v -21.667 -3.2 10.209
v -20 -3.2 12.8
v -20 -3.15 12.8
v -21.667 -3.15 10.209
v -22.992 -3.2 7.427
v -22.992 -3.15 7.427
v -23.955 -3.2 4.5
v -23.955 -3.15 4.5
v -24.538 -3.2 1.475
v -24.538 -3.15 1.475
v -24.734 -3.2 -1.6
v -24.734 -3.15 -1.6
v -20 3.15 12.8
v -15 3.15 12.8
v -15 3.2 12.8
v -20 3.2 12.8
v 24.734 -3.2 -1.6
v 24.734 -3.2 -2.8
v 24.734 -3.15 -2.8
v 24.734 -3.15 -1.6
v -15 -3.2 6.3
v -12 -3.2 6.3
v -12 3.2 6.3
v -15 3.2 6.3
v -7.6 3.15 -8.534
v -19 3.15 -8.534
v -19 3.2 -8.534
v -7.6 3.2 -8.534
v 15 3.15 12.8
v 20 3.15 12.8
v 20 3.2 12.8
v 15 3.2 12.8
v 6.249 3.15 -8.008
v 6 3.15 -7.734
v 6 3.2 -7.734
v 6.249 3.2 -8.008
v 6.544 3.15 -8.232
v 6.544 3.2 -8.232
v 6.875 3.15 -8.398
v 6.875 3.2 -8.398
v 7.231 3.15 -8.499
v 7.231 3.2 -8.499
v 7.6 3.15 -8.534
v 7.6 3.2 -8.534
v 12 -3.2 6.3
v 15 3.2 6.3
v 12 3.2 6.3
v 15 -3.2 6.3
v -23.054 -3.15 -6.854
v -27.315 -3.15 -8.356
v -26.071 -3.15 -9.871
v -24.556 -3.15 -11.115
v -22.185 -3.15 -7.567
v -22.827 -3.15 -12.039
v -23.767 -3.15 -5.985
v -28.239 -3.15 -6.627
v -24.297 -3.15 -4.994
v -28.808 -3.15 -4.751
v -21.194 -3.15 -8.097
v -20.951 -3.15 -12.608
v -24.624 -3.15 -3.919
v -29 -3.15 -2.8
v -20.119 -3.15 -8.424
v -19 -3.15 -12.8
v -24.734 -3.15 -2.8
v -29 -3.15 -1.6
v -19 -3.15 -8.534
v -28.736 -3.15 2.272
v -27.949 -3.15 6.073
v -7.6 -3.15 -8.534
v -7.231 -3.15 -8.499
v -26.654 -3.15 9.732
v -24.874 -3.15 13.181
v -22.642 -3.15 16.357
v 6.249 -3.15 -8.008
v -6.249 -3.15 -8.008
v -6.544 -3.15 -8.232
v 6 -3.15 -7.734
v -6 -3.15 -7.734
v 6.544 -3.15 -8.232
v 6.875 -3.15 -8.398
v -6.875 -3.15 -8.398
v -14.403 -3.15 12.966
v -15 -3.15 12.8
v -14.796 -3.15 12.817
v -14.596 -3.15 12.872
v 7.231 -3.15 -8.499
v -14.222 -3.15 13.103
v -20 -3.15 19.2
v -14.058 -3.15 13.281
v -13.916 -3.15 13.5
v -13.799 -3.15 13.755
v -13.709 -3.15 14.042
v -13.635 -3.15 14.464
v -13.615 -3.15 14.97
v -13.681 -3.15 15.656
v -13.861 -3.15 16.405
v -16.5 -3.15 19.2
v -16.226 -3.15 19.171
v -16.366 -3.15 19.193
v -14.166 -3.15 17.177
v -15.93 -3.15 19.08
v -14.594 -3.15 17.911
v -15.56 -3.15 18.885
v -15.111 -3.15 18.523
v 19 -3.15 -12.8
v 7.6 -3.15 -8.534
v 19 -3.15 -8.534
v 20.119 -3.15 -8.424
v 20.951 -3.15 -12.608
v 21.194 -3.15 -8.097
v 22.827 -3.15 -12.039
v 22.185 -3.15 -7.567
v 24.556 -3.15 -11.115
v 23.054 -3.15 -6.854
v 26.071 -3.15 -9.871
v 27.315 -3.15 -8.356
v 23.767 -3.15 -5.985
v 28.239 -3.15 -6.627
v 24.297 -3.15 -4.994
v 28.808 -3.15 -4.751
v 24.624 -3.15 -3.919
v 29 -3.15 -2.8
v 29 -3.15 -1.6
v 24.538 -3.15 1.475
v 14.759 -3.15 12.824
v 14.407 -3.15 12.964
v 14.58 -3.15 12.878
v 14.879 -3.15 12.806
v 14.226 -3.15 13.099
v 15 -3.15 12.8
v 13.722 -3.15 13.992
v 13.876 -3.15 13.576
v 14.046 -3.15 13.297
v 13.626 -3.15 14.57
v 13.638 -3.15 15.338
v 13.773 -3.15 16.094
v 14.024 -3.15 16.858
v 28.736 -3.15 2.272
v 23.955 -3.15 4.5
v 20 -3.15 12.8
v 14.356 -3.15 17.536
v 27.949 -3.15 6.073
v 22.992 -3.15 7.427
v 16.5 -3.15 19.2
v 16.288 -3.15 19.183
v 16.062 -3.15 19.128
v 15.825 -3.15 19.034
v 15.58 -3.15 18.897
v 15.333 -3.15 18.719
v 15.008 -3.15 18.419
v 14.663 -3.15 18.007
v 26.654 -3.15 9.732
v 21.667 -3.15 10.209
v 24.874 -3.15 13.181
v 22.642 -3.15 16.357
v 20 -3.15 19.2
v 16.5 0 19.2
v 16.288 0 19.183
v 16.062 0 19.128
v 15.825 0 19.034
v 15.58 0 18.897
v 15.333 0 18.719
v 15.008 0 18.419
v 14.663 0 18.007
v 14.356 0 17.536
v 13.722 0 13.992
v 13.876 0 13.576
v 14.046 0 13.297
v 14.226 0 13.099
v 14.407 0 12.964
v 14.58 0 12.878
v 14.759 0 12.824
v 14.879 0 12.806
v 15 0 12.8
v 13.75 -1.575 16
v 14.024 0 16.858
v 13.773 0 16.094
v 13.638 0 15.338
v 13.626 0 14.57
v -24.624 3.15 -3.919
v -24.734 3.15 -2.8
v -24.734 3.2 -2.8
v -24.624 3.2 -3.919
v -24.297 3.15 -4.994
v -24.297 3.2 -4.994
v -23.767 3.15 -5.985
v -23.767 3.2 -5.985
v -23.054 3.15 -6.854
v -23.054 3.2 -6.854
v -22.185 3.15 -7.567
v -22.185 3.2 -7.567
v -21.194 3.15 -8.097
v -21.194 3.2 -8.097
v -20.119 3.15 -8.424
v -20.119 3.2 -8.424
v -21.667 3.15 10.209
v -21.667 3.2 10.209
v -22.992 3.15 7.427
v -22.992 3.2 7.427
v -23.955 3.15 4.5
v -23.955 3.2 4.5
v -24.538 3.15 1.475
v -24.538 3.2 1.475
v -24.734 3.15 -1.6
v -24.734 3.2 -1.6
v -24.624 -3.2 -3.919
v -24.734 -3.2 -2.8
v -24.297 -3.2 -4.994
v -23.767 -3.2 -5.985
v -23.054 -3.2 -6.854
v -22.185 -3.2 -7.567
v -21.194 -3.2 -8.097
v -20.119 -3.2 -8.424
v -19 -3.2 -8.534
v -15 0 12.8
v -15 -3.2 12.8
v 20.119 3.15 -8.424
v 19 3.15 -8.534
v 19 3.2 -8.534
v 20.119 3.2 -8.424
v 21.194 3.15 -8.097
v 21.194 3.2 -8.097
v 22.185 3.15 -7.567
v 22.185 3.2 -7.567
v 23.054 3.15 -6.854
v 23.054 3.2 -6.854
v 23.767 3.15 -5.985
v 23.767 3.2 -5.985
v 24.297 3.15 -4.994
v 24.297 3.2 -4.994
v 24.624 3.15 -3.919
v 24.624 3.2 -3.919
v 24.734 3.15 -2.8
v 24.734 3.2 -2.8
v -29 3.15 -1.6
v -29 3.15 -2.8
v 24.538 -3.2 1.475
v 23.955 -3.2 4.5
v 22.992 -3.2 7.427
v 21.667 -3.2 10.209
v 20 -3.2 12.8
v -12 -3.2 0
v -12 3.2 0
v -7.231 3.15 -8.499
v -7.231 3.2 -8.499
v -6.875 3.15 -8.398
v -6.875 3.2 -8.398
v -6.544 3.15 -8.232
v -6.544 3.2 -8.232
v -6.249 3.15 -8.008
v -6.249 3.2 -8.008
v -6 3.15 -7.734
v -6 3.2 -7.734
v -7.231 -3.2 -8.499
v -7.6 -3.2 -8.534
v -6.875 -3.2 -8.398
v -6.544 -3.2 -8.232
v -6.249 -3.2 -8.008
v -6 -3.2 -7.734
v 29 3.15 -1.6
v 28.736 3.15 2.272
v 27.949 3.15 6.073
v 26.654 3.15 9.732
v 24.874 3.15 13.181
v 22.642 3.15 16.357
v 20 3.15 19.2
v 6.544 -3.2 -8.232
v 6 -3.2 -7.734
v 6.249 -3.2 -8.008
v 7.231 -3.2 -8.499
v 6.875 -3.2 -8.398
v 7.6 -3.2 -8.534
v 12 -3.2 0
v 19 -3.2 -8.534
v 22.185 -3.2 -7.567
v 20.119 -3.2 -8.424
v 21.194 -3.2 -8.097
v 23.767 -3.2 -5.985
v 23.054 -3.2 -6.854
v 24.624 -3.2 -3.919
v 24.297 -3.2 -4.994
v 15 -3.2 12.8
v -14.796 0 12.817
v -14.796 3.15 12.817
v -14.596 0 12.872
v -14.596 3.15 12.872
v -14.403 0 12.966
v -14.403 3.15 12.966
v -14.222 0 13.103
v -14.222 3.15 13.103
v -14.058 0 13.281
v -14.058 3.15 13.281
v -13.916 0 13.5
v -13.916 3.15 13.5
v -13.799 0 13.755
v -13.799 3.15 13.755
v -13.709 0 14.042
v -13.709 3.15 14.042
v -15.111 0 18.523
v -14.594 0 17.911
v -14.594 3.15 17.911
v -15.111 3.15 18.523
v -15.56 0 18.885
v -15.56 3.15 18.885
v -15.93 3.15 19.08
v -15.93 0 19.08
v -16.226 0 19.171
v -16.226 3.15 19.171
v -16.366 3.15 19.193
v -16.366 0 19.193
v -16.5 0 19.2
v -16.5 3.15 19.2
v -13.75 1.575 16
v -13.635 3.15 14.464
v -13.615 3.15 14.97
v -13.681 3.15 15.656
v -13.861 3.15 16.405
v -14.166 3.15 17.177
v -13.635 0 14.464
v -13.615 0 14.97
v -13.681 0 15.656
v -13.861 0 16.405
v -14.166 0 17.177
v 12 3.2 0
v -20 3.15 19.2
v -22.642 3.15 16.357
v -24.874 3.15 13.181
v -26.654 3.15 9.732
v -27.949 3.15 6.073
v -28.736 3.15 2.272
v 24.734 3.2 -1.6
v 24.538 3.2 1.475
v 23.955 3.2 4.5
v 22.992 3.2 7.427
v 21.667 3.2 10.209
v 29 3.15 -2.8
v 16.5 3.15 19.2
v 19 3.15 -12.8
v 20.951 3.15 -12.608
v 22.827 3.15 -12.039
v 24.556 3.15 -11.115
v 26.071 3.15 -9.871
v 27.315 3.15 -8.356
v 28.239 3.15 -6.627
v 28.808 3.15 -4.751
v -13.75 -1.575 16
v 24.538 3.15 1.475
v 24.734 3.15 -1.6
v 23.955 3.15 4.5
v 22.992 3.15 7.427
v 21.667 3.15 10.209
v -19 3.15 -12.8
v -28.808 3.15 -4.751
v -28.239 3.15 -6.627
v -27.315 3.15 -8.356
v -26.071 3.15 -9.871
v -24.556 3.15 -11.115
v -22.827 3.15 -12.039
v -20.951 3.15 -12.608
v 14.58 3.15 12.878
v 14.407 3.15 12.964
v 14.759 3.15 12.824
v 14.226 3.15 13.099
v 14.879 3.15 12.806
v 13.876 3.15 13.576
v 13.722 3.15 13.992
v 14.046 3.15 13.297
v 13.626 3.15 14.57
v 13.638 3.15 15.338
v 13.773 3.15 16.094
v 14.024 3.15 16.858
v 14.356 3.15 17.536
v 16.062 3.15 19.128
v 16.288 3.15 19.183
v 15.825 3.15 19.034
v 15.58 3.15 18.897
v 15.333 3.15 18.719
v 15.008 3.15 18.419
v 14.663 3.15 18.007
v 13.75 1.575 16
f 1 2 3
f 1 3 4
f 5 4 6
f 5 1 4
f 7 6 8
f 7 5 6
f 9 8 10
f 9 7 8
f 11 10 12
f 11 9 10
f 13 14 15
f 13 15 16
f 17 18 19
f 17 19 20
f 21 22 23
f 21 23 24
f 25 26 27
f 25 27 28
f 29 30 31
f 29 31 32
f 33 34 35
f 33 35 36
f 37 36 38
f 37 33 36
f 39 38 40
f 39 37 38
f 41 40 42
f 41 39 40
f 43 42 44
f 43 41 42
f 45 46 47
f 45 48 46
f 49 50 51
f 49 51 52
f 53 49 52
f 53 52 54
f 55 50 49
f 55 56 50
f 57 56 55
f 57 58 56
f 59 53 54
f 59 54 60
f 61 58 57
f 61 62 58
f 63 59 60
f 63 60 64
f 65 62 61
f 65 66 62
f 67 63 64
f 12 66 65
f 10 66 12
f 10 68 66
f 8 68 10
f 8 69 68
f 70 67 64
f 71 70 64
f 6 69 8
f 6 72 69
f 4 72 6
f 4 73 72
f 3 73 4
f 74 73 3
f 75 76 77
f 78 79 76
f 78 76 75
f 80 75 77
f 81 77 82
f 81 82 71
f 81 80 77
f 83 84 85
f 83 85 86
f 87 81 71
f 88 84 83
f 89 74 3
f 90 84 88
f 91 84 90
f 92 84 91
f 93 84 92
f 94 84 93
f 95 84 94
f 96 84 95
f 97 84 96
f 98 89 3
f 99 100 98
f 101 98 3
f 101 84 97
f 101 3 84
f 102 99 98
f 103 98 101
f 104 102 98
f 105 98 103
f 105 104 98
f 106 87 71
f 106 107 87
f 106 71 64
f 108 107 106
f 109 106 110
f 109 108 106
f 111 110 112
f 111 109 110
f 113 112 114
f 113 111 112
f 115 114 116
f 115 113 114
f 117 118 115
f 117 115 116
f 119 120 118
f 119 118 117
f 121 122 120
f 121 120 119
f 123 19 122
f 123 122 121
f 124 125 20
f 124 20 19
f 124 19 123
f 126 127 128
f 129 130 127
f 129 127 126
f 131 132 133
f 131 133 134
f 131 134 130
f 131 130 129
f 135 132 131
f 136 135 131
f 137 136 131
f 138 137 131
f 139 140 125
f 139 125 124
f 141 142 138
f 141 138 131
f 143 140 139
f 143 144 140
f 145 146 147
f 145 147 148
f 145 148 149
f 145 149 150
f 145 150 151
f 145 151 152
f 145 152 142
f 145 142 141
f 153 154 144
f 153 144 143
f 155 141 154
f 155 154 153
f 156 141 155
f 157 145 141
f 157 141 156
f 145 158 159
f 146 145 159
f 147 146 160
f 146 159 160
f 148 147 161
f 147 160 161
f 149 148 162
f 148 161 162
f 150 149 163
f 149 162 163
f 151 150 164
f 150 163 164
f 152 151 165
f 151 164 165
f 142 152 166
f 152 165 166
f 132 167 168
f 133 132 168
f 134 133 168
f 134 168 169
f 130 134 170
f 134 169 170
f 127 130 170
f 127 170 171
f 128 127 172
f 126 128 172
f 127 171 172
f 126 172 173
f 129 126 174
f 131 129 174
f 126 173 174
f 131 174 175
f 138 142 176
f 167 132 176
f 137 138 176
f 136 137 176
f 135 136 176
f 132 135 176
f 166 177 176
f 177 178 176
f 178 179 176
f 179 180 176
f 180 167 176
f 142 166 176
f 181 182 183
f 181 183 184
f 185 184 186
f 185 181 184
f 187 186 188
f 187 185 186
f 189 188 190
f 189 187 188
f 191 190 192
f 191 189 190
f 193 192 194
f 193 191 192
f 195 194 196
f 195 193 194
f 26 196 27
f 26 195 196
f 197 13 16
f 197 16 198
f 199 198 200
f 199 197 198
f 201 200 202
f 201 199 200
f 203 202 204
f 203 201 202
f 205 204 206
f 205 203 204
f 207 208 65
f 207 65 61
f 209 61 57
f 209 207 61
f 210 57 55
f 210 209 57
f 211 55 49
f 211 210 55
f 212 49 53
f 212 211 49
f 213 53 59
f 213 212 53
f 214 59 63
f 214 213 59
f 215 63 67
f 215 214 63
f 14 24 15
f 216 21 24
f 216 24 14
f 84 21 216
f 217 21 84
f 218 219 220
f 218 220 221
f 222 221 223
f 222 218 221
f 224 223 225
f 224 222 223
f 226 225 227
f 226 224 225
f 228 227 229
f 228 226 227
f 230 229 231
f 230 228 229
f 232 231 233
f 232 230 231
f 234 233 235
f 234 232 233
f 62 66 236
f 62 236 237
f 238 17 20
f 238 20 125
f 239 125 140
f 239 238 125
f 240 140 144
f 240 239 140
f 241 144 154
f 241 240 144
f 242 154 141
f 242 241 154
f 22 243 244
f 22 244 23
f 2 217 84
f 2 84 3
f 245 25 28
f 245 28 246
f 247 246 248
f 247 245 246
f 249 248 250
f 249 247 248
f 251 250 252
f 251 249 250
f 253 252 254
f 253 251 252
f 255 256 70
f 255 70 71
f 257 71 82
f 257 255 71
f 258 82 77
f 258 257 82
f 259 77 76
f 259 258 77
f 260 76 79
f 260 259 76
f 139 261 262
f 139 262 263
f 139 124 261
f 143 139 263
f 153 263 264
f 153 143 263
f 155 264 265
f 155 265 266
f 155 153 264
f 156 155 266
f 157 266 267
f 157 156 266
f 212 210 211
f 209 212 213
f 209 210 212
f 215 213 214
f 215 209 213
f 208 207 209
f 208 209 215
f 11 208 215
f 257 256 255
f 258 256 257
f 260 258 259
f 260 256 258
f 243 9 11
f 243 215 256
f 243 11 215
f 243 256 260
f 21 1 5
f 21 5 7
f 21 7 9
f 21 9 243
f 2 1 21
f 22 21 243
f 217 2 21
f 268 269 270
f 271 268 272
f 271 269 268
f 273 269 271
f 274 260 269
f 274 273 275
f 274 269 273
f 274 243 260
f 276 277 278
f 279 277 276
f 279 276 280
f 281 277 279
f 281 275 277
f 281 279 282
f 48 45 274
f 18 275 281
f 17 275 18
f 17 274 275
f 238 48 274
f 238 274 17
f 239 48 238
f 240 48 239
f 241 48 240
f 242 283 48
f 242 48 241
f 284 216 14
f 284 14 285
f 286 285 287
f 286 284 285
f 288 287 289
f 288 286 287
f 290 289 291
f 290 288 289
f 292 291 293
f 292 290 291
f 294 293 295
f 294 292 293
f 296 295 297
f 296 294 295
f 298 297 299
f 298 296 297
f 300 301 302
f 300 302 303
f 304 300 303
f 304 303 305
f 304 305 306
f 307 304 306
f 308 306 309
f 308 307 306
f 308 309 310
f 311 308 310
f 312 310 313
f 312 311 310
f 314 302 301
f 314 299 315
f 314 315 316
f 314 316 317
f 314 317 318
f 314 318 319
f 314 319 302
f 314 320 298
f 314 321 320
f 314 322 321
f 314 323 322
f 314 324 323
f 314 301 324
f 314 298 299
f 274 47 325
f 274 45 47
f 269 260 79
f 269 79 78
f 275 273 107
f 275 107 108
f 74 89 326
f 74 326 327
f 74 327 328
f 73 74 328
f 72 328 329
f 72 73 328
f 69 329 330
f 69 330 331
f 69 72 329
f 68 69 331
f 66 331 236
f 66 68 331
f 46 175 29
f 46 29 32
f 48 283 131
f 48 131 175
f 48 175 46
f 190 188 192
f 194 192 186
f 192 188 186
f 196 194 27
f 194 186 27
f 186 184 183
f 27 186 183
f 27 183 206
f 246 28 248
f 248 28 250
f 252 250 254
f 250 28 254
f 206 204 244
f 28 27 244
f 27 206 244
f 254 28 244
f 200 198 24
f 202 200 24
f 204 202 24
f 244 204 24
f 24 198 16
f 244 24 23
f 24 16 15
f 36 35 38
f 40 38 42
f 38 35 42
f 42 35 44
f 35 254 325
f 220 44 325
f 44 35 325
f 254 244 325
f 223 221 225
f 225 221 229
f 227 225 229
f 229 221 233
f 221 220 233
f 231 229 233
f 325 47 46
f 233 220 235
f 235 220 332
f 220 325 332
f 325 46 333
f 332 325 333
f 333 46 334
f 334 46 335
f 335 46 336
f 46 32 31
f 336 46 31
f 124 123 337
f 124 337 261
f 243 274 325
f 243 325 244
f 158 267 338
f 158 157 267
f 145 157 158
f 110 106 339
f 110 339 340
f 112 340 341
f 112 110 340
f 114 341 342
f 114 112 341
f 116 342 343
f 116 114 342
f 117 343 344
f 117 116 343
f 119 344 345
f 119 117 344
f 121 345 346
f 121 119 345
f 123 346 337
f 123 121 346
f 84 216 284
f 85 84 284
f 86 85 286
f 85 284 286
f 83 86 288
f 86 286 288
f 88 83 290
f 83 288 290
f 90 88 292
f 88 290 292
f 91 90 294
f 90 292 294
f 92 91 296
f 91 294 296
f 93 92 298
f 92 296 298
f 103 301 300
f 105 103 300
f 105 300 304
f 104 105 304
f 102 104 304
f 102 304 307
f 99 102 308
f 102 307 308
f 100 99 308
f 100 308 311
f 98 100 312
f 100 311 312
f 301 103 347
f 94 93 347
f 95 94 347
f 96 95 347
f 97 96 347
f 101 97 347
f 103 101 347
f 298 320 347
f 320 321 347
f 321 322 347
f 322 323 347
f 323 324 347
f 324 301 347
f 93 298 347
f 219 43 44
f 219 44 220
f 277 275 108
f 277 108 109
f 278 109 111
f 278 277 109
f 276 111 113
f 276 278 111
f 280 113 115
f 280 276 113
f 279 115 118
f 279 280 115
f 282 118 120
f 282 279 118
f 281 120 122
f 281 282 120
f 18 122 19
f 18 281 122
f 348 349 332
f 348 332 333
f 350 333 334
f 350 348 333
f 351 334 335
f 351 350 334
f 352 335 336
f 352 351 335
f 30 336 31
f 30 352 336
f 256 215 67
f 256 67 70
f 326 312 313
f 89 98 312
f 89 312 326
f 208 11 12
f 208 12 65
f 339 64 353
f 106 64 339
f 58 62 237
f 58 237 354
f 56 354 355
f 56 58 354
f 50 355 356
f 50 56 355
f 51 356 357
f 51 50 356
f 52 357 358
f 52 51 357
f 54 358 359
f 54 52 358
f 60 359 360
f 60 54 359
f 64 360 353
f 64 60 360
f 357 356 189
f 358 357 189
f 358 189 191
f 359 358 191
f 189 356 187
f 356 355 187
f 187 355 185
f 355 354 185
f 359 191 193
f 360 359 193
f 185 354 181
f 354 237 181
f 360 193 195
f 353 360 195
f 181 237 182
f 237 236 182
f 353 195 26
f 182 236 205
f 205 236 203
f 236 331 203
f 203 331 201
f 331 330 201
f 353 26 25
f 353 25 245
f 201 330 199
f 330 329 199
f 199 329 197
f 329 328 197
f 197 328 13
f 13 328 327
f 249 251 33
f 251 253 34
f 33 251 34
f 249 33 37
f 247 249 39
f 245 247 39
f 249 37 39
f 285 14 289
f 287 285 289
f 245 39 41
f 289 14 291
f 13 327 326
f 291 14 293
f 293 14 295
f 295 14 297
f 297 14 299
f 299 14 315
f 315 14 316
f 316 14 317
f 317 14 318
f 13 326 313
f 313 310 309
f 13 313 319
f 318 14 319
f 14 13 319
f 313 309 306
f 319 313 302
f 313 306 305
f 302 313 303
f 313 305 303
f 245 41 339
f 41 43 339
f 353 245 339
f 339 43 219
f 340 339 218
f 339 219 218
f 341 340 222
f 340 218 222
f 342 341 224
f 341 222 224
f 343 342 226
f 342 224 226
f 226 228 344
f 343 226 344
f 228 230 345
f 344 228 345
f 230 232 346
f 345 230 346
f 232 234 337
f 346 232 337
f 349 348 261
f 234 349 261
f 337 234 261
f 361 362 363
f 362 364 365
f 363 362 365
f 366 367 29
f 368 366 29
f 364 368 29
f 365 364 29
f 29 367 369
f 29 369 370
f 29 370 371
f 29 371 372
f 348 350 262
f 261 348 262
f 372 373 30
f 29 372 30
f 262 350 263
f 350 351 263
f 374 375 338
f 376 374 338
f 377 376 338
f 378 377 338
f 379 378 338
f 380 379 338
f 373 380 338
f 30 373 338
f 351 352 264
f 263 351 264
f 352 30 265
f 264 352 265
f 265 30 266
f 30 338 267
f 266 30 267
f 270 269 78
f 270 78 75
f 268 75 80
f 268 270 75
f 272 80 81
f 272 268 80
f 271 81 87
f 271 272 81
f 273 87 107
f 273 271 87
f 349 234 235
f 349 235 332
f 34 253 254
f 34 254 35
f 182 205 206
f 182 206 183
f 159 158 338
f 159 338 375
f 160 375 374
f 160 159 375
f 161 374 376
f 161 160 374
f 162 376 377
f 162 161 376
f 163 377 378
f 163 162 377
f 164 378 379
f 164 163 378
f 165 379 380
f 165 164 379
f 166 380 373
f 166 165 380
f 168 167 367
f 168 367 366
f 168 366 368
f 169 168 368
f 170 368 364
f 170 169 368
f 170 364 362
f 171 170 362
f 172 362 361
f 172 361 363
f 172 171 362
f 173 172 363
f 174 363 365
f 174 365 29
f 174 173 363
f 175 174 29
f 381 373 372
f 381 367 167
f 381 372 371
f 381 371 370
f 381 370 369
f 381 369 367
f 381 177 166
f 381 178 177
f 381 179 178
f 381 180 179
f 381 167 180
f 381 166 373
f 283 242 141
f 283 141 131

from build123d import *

# Parameters (mm, degrees)
F2_DEPTH = 3.2
F3_DEPTH = 3.15


with BuildPart() as f2:
    # F1 (on Front) → F2 (new body, symmetric)
    with BuildSketch(Plane.XZ):
        with BuildLine():
            Line((12, 6.3), (12, 0))
            Line((12, 0), (-12, 0))
            Line((-12, 0), (-12, 6.3))
            Line((-12, 6.3), (-15, 6.3))
            Line((-15, 6.3), (-15, 12.8))
            Line((-15, 12.8), (-20, 12.8))
            ThreePointArc((-20, 12.8), (-23.5199404292, 5.9790524317), (-24.7337240148, -1.6))
            Line((-24.7337240148, -1.6), (-24.7337240148, -2.8))
            ThreePointArc((-24.7337240148, -2.8), (-23.0543551323, -6.8543551323), (-19, -8.5337240148))
            Line((-19, -8.5337240148), (-7.6, -8.5337240148))
            ThreePointArc((-7.6, -8.5337240148), (-6.705572809, -8.3225783968), (-6, -7.7337240148))
            Line((-6, -7.7337240148), (6, -7.7337240148))
            ThreePointArc((6, -7.7337240148), (6.705572809, -8.3225783968), (7.6, -8.5337240148))
            Line((7.6, -8.5337240148), (19, -8.5337240148))
            ThreePointArc((19, -8.5337240148), (23.0543551323, -6.8543551323), (24.7337240148, -2.8))
            Line((24.7337240148, -2.8), (24.7337240148, -1.6))
            ThreePointArc((24.7337240148, -1.6), (23.5199404292, 5.9790524317), (20, 12.8))
            Line((20, 12.8), (15, 12.8))
            Line((15, 12.8), (15, 6.3))
            Line((15, 6.3), (12, 6.3))
        make_face()
    extrude(amount=F2_DEPTH, both=True)

    # F1 (on Front) → F3 (join, symmetric)
    with BuildSketch(Plane.XZ):
        with BuildLine():
            add(Edge.make_bspline(
                [(16.5, 19.2), (14.5000000527, 19.2), (13.7500000527, 16), (13.0000000527, 12.8), (15, 12.8)],
                knots=[0.2076781727, 0.2076781727, 0.2076781727, 1.7784744995, 1.7784744995, 3.3492708263, 3.3492708263, 3.3492708263], degree=2, weights=[1, 0.7071067812, 1, 0.7071067812, 1]))
            Line((15, 12.8), (20, 12.8))
            ThreePointArc((20, 12.8), (23.5199404292, 5.9790524317), (24.7337240148, -1.6))
            Line((24.7337240148, -1.6), (24.7337240148, -2.8))
            ThreePointArc((24.7337240148, -2.8), (23.0543551323, -6.8543551323), (19, -8.5337240148))
            Line((19, -8.5337240148), (7.6, -8.5337240148))
            ThreePointArc((7.6, -8.5337240148), (6.705572809, -8.3225783968), (6, -7.7337240148))
            Line((6, -7.7337240148), (-6, -7.7337240148))
            ThreePointArc((-6, -7.7337240148), (-6.705572809, -8.3225783968), (-7.6, -8.5337240148))
            Line((-7.6, -8.5337240148), (-19, -8.5337240148))
            ThreePointArc((-19, -8.5337240148), (-23.0543551323, -6.8543551323), (-24.7337240148, -2.8))
            Line((-24.7337240148, -2.8), (-24.7337240148, -1.6))
            ThreePointArc((-24.7337240148, -1.6), (-23.5199404292, 5.9790524317), (-20, 12.8))
            Line((-20, 12.8), (-15, 12.8))
            add(Edge.make_bspline(
                [(-14.9999999473, 12.8), (-13, 12.8), (-13.7499999802, 15.9999999157), (-14.4999999605, 19.1999998315), (-16.4999999473, 19.2)],
                knots=[6.0755071131, 6.0755071131, 6.0755071131, 7.6463034136, 7.6463034136, 9.217099714, 9.217099714, 9.217099714], degree=2, weights=[1, 0.7071067905, 1, 0.7071067905, 1]))
            Line((-16.5, 19.2), (-20, 19.2))
            ThreePointArc((-20, 19.2), (-26.653524819, 9.7318136236), (-29, -1.6))
            Line((-29, -1.6), (-29, -2.8))
            ThreePointArc((-29, -2.8), (-26.0710678119, -9.8710678119), (-19, -12.8))
            Line((-19, -12.8), (19, -12.8))
            ThreePointArc((19, -12.8), (26.0710678119, -9.8710678119), (29, -2.8))
            Line((29, -2.8), (29, -1.6))
            ThreePointArc((29, -1.6), (26.653524819, 9.7318136236), (20, 19.2))
            Line((20, 19.2), (16.5, 19.2))
        make_face()
    extrude(amount=F3_DEPTH, both=True)


solid = f2.part
